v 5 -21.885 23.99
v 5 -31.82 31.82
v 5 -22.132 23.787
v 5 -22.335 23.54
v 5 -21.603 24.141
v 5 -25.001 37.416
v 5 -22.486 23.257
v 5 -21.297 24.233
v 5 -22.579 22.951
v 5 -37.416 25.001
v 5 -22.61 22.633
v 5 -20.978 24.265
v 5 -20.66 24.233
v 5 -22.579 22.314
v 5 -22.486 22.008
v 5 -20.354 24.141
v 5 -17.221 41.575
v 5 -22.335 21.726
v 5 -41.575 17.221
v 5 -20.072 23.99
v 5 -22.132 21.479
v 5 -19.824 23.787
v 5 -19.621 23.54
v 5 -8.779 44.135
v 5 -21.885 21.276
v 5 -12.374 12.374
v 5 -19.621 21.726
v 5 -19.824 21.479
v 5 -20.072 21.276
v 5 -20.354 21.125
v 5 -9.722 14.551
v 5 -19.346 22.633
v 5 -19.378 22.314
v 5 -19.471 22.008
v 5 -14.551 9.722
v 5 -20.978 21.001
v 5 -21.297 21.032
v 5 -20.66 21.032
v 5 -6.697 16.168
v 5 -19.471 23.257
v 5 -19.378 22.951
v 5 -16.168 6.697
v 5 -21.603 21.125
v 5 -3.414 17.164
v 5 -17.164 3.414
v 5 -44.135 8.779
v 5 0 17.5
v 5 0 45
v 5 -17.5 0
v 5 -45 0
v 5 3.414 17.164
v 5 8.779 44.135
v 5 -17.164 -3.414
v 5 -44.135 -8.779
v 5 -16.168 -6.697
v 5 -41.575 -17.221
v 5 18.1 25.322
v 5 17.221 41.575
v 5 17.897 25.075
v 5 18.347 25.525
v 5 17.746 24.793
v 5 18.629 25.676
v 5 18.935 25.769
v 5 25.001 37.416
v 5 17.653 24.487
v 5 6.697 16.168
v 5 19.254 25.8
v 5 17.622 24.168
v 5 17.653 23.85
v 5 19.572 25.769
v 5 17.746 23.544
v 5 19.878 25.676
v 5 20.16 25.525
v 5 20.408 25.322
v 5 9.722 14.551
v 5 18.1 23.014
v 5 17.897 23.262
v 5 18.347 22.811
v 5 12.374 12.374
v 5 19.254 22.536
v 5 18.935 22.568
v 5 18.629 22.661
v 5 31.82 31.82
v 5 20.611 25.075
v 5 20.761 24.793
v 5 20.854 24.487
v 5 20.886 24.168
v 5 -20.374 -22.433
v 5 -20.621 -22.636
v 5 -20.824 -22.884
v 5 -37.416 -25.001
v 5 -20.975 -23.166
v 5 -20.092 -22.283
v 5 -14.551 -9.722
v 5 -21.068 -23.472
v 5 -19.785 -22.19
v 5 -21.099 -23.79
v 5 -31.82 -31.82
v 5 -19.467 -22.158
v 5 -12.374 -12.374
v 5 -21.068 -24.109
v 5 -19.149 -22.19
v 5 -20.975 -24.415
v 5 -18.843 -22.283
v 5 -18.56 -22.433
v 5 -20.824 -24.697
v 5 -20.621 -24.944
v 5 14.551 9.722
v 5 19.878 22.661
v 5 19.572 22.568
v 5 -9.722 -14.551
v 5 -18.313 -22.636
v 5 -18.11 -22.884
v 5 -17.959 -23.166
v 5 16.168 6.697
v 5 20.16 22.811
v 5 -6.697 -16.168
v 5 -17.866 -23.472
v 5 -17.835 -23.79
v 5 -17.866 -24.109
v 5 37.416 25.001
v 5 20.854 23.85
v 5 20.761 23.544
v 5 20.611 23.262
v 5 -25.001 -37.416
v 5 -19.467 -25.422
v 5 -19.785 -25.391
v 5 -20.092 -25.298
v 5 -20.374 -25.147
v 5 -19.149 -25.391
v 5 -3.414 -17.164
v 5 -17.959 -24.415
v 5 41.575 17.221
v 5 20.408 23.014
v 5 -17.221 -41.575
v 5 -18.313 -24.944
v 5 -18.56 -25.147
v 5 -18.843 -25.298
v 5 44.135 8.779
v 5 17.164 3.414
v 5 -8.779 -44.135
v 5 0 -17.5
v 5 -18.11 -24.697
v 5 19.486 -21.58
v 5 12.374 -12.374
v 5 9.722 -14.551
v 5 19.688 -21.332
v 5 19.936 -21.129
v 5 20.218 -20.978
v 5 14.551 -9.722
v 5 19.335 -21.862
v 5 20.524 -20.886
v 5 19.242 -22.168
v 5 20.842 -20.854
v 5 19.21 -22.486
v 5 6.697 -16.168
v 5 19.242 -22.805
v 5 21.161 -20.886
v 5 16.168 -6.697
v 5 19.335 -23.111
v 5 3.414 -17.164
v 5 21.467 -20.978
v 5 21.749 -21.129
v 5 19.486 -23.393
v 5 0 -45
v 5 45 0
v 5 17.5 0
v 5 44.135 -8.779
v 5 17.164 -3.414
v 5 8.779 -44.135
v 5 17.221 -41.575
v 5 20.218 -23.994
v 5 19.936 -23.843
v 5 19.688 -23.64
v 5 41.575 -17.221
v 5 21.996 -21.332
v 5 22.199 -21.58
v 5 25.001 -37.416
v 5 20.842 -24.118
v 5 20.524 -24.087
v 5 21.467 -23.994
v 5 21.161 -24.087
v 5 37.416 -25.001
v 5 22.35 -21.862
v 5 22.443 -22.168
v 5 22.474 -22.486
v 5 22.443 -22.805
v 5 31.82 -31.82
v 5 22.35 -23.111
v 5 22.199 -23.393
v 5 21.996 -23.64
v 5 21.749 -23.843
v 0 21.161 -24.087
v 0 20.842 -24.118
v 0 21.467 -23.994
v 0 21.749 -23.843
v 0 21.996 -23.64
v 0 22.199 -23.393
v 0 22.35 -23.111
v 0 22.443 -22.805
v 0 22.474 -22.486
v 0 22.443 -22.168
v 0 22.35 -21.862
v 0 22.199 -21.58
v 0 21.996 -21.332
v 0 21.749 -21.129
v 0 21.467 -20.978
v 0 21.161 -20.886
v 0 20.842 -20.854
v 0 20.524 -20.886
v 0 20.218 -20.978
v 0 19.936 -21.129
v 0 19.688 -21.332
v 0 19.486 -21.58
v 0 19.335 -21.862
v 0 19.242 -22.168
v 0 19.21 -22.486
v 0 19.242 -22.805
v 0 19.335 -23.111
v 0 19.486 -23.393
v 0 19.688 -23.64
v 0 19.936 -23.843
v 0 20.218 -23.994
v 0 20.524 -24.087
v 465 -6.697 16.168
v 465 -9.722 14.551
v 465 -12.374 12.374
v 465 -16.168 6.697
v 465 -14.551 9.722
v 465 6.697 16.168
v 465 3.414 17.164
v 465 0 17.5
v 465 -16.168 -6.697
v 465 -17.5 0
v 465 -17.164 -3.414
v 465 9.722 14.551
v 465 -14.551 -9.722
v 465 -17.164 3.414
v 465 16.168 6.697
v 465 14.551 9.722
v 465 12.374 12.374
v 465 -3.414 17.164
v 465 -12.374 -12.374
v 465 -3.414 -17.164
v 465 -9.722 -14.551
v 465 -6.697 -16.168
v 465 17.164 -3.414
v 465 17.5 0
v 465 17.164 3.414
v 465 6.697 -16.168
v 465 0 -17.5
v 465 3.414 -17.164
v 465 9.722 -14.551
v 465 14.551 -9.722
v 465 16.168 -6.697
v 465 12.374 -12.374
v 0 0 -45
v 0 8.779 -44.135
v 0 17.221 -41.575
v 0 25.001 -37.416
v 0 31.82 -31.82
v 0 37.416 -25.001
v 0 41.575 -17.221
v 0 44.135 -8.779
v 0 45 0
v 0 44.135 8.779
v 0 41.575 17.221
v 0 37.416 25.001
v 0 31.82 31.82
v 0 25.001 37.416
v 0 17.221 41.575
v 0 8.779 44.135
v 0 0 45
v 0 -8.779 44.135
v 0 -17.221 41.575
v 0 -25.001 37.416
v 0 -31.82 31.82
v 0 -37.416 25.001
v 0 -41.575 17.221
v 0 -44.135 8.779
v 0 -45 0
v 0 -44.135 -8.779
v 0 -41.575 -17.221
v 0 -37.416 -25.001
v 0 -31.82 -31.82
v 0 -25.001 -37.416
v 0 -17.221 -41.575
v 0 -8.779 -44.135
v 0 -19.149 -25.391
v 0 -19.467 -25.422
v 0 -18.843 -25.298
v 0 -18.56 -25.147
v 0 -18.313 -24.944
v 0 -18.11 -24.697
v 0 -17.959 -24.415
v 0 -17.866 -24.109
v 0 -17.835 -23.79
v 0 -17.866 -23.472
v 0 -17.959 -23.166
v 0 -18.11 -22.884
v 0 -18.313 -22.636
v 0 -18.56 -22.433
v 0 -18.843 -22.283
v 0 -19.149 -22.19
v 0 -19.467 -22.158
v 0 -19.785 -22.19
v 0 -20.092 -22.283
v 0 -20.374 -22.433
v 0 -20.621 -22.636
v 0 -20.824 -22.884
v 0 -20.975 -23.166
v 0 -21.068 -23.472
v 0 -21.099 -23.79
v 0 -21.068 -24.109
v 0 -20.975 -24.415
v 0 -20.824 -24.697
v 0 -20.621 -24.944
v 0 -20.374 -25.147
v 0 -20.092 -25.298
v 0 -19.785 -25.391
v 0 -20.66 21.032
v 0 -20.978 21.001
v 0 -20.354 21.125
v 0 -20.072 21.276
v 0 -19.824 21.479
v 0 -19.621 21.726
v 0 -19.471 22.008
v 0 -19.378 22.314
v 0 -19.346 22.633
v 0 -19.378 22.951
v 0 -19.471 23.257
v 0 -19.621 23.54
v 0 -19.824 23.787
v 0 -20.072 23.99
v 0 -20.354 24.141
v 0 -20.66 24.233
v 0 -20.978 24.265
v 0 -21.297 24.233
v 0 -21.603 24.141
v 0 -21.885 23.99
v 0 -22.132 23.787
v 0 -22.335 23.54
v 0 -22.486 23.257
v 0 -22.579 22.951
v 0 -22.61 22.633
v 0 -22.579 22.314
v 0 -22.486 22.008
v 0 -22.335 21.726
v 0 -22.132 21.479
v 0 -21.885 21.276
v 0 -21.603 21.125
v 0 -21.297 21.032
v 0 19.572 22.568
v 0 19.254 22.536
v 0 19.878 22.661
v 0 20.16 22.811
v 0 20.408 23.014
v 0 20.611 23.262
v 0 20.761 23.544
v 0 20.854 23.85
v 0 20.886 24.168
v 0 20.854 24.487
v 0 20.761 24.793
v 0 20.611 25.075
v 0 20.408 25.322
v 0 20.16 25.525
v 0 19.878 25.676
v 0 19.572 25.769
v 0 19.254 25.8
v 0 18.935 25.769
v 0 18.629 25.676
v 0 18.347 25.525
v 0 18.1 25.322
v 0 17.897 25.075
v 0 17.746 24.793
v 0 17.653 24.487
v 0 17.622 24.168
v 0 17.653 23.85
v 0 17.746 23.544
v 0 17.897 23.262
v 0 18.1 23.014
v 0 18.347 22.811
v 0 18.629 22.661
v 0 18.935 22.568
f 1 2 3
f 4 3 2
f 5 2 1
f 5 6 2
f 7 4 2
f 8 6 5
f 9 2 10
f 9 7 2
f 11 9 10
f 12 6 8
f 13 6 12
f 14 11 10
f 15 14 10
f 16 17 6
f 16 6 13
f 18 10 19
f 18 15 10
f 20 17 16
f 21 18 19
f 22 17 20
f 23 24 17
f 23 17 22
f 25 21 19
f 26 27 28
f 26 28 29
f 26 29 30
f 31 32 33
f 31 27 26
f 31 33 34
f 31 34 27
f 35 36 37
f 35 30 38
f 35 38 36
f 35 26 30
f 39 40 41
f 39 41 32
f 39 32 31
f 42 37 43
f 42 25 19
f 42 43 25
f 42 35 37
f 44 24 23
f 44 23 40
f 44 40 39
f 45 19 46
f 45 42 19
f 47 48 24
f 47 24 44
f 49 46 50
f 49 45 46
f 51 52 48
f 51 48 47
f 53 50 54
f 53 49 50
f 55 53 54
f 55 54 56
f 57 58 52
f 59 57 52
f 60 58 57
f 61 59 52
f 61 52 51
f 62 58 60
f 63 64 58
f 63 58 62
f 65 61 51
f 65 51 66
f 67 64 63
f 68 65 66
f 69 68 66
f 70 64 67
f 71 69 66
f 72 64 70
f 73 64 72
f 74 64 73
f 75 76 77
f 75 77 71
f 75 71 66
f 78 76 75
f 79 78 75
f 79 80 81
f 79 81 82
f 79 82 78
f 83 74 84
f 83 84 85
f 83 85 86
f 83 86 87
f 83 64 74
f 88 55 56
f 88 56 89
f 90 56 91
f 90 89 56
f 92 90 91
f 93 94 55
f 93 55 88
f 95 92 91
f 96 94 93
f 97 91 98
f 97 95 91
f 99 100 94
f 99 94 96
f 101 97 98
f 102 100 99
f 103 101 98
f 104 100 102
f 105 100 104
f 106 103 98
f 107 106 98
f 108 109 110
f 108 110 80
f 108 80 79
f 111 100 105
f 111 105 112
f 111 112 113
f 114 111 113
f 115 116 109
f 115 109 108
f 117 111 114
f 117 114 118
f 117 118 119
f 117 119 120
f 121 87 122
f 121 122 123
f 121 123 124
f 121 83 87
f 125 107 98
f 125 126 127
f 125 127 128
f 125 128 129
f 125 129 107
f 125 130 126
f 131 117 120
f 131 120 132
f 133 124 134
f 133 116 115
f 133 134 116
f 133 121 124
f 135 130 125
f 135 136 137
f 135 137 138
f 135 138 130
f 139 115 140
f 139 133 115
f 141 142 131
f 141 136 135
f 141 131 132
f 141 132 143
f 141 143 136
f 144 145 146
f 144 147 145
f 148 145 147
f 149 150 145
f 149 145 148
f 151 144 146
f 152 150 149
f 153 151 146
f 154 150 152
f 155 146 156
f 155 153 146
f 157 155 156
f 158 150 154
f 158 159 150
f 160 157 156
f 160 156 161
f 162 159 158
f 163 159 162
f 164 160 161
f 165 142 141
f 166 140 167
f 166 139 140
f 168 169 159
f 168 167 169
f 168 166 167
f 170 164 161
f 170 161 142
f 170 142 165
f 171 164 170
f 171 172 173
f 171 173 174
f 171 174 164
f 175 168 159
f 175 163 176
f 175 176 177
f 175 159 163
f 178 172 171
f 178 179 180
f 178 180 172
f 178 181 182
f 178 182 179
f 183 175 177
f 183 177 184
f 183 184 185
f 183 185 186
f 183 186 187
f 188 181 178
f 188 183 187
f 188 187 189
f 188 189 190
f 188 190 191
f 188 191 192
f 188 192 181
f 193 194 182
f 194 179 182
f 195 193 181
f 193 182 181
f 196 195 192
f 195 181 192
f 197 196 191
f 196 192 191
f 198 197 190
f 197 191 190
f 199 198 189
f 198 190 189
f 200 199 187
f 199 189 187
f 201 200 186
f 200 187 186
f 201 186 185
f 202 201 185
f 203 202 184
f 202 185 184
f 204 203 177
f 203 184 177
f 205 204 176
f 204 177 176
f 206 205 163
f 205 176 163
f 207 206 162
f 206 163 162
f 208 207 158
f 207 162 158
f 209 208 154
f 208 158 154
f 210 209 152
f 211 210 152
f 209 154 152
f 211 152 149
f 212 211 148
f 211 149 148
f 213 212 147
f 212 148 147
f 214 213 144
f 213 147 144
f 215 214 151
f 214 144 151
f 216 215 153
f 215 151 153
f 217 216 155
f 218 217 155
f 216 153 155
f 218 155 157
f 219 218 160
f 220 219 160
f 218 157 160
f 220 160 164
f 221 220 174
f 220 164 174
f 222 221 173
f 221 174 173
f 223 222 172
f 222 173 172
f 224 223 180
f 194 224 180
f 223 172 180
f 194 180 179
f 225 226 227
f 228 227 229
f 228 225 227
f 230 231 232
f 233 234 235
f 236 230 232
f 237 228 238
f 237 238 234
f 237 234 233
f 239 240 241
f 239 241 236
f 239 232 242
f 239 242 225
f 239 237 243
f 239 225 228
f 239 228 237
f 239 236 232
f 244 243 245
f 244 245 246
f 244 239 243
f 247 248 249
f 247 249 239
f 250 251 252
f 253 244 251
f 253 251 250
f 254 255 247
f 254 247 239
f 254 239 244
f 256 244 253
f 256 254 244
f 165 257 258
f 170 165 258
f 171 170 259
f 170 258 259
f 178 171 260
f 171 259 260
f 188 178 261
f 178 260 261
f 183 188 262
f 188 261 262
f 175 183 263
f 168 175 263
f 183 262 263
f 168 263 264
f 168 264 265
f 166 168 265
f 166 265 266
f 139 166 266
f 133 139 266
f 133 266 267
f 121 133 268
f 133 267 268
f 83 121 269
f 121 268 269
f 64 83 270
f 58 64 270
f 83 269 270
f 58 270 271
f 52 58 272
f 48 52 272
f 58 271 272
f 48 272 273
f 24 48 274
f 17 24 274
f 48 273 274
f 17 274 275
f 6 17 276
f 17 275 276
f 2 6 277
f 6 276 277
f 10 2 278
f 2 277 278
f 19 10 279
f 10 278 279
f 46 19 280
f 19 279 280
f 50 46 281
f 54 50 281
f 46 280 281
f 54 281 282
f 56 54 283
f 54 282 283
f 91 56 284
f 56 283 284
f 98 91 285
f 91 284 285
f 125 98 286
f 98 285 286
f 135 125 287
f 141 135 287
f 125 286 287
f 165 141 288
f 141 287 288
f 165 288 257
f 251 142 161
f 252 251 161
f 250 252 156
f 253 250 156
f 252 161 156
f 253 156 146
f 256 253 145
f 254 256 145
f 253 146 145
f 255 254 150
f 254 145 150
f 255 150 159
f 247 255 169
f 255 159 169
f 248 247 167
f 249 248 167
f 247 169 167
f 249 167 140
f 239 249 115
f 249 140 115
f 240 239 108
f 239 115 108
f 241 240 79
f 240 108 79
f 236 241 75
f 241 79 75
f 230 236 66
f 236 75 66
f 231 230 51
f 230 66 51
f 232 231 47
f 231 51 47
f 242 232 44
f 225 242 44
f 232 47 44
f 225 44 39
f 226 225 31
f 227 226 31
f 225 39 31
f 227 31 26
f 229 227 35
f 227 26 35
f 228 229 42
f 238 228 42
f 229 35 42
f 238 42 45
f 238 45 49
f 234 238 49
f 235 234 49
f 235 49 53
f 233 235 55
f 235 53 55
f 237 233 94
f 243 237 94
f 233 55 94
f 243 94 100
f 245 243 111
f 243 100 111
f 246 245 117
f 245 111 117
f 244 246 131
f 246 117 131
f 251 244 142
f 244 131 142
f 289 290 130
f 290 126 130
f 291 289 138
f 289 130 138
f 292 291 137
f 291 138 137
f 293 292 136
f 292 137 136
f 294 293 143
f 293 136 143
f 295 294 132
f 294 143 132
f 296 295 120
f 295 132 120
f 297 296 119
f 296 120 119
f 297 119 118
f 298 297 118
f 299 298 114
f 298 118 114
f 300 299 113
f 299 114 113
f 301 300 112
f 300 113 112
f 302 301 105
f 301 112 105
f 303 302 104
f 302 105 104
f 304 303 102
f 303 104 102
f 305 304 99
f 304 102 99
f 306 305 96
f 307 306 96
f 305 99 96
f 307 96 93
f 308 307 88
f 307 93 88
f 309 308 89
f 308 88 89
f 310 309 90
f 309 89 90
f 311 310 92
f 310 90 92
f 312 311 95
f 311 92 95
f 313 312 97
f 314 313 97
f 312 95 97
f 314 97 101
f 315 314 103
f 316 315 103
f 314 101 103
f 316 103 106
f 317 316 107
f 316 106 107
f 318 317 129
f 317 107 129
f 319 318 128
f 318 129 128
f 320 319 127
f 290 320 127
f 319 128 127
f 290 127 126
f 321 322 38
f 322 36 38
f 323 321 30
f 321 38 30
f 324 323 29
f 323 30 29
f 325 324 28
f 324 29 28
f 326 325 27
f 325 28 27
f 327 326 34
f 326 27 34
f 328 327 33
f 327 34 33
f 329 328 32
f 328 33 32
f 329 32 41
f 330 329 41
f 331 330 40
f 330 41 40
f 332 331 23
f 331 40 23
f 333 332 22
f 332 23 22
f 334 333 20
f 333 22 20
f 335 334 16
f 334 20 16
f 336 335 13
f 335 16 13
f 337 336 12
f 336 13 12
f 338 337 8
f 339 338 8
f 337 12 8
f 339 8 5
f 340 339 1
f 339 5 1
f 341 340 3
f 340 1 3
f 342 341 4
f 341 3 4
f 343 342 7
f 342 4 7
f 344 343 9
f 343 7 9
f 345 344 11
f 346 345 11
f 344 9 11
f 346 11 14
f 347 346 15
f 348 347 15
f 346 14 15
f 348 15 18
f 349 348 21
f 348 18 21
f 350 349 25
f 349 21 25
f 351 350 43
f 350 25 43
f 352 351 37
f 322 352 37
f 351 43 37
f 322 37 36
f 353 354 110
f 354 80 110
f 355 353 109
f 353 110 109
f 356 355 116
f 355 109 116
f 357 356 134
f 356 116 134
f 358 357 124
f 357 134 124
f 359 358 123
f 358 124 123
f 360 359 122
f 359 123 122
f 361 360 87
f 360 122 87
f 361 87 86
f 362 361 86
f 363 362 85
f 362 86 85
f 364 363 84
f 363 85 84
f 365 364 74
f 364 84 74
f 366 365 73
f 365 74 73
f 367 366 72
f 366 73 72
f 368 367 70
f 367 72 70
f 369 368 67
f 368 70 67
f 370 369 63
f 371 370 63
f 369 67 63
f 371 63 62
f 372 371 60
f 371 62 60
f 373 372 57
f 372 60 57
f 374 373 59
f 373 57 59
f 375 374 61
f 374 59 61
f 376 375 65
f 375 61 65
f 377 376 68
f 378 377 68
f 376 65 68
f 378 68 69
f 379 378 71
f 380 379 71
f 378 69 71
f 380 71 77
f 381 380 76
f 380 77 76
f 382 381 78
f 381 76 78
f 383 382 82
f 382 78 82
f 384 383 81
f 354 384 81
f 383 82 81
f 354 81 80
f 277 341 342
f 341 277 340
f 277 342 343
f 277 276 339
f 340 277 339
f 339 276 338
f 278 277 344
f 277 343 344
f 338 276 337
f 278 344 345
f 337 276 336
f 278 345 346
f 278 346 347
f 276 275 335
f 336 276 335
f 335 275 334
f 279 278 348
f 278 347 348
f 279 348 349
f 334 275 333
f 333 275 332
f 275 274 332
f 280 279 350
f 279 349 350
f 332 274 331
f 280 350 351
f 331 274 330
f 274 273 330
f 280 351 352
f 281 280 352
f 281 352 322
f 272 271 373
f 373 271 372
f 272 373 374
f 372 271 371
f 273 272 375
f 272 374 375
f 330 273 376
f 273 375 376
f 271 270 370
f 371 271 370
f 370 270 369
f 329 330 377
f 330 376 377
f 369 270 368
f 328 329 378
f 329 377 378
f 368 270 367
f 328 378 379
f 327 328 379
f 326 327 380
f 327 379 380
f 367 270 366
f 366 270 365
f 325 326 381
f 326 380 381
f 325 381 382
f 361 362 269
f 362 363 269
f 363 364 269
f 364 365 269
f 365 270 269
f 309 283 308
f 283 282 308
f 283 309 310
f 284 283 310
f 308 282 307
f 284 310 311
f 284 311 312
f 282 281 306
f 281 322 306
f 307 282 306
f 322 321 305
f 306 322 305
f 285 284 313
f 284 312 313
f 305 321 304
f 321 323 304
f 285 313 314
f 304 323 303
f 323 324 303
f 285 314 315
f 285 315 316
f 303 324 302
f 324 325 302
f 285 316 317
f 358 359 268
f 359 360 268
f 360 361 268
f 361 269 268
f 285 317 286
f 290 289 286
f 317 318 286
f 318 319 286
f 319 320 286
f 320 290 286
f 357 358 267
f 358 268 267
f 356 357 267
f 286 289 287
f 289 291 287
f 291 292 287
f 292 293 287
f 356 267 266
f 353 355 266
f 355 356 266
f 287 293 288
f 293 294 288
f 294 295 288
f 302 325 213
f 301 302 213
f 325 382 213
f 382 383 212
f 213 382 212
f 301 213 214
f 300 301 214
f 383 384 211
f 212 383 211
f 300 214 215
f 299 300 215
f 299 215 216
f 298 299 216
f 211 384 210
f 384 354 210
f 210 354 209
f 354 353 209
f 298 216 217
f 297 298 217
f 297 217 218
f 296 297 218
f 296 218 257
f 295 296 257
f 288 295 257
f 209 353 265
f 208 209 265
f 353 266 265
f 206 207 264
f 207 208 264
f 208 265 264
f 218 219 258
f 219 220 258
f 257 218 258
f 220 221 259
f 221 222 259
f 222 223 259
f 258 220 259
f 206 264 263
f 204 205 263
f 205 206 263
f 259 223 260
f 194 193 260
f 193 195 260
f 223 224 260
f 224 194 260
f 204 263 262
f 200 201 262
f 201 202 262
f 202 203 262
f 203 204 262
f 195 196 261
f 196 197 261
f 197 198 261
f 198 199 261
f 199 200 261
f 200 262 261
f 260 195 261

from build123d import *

# Parameters (mm, degrees)
CROQUIS1_R                      = 45
SALIENTE_EXTRUIR1_DEPTH         = 5
CROQUIS2_R                      = 17.5
SALIENTE_EXTRUIR2_DEPTH         = 460
TALADRO_DE_MARGEN_PARA_45_D     = 3.2639
TALADRO_DE_MARGEN_PARA_45_DEPTH = 5
TALADRO_DE_MARGEN_PARA_45_TIP   = 0.980574487


with BuildPart() as part:
    # Croquis1 → Saliente-Extruir1 (new body)
    with BuildSketch(Plane(origin=(0, 0, 0), x_dir=(0, 0, -1), z_dir=(1, 0, 0))):
        Circle(CROQUIS1_R)
    extrude(amount=SALIENTE_EXTRUIR1_DEPTH)

    # Croquis2 → Saliente-Extruir2 (add)
    with BuildSketch(Plane(origin=(5, 0, 0), x_dir=(0, 0, -1), z_dir=(1, 0, 0))):
        Circle(CROQUIS2_R)
    extrude(amount=SALIENTE_EXTRUIR2_DEPTH)

    # Taladro de margen para #45
    with Locations(Plane.ZY):
        with Locations((24.168284878, 19.253675131), (-22.486191371, 20.842427824), (-23.790363973, -19.467053758), (22.632872333, -20.978386258)):
            Hole(TALADRO_DE_MARGEN_PARA_45_D / 2, depth=TALADRO_DE_MARGEN_PARA_45_DEPTH)
            with Locations((0, 0, -(TALADRO_DE_MARGEN_PARA_45_DEPTH + TALADRO_DE_MARGEN_PARA_45_TIP / 2))):  # 118° drill point
                Cone(0, TALADRO_DE_MARGEN_PARA_45_D / 2, TALADRO_DE_MARGEN_PARA_45_TIP, mode=Mode.SUBTRACT)


solid = part.part
